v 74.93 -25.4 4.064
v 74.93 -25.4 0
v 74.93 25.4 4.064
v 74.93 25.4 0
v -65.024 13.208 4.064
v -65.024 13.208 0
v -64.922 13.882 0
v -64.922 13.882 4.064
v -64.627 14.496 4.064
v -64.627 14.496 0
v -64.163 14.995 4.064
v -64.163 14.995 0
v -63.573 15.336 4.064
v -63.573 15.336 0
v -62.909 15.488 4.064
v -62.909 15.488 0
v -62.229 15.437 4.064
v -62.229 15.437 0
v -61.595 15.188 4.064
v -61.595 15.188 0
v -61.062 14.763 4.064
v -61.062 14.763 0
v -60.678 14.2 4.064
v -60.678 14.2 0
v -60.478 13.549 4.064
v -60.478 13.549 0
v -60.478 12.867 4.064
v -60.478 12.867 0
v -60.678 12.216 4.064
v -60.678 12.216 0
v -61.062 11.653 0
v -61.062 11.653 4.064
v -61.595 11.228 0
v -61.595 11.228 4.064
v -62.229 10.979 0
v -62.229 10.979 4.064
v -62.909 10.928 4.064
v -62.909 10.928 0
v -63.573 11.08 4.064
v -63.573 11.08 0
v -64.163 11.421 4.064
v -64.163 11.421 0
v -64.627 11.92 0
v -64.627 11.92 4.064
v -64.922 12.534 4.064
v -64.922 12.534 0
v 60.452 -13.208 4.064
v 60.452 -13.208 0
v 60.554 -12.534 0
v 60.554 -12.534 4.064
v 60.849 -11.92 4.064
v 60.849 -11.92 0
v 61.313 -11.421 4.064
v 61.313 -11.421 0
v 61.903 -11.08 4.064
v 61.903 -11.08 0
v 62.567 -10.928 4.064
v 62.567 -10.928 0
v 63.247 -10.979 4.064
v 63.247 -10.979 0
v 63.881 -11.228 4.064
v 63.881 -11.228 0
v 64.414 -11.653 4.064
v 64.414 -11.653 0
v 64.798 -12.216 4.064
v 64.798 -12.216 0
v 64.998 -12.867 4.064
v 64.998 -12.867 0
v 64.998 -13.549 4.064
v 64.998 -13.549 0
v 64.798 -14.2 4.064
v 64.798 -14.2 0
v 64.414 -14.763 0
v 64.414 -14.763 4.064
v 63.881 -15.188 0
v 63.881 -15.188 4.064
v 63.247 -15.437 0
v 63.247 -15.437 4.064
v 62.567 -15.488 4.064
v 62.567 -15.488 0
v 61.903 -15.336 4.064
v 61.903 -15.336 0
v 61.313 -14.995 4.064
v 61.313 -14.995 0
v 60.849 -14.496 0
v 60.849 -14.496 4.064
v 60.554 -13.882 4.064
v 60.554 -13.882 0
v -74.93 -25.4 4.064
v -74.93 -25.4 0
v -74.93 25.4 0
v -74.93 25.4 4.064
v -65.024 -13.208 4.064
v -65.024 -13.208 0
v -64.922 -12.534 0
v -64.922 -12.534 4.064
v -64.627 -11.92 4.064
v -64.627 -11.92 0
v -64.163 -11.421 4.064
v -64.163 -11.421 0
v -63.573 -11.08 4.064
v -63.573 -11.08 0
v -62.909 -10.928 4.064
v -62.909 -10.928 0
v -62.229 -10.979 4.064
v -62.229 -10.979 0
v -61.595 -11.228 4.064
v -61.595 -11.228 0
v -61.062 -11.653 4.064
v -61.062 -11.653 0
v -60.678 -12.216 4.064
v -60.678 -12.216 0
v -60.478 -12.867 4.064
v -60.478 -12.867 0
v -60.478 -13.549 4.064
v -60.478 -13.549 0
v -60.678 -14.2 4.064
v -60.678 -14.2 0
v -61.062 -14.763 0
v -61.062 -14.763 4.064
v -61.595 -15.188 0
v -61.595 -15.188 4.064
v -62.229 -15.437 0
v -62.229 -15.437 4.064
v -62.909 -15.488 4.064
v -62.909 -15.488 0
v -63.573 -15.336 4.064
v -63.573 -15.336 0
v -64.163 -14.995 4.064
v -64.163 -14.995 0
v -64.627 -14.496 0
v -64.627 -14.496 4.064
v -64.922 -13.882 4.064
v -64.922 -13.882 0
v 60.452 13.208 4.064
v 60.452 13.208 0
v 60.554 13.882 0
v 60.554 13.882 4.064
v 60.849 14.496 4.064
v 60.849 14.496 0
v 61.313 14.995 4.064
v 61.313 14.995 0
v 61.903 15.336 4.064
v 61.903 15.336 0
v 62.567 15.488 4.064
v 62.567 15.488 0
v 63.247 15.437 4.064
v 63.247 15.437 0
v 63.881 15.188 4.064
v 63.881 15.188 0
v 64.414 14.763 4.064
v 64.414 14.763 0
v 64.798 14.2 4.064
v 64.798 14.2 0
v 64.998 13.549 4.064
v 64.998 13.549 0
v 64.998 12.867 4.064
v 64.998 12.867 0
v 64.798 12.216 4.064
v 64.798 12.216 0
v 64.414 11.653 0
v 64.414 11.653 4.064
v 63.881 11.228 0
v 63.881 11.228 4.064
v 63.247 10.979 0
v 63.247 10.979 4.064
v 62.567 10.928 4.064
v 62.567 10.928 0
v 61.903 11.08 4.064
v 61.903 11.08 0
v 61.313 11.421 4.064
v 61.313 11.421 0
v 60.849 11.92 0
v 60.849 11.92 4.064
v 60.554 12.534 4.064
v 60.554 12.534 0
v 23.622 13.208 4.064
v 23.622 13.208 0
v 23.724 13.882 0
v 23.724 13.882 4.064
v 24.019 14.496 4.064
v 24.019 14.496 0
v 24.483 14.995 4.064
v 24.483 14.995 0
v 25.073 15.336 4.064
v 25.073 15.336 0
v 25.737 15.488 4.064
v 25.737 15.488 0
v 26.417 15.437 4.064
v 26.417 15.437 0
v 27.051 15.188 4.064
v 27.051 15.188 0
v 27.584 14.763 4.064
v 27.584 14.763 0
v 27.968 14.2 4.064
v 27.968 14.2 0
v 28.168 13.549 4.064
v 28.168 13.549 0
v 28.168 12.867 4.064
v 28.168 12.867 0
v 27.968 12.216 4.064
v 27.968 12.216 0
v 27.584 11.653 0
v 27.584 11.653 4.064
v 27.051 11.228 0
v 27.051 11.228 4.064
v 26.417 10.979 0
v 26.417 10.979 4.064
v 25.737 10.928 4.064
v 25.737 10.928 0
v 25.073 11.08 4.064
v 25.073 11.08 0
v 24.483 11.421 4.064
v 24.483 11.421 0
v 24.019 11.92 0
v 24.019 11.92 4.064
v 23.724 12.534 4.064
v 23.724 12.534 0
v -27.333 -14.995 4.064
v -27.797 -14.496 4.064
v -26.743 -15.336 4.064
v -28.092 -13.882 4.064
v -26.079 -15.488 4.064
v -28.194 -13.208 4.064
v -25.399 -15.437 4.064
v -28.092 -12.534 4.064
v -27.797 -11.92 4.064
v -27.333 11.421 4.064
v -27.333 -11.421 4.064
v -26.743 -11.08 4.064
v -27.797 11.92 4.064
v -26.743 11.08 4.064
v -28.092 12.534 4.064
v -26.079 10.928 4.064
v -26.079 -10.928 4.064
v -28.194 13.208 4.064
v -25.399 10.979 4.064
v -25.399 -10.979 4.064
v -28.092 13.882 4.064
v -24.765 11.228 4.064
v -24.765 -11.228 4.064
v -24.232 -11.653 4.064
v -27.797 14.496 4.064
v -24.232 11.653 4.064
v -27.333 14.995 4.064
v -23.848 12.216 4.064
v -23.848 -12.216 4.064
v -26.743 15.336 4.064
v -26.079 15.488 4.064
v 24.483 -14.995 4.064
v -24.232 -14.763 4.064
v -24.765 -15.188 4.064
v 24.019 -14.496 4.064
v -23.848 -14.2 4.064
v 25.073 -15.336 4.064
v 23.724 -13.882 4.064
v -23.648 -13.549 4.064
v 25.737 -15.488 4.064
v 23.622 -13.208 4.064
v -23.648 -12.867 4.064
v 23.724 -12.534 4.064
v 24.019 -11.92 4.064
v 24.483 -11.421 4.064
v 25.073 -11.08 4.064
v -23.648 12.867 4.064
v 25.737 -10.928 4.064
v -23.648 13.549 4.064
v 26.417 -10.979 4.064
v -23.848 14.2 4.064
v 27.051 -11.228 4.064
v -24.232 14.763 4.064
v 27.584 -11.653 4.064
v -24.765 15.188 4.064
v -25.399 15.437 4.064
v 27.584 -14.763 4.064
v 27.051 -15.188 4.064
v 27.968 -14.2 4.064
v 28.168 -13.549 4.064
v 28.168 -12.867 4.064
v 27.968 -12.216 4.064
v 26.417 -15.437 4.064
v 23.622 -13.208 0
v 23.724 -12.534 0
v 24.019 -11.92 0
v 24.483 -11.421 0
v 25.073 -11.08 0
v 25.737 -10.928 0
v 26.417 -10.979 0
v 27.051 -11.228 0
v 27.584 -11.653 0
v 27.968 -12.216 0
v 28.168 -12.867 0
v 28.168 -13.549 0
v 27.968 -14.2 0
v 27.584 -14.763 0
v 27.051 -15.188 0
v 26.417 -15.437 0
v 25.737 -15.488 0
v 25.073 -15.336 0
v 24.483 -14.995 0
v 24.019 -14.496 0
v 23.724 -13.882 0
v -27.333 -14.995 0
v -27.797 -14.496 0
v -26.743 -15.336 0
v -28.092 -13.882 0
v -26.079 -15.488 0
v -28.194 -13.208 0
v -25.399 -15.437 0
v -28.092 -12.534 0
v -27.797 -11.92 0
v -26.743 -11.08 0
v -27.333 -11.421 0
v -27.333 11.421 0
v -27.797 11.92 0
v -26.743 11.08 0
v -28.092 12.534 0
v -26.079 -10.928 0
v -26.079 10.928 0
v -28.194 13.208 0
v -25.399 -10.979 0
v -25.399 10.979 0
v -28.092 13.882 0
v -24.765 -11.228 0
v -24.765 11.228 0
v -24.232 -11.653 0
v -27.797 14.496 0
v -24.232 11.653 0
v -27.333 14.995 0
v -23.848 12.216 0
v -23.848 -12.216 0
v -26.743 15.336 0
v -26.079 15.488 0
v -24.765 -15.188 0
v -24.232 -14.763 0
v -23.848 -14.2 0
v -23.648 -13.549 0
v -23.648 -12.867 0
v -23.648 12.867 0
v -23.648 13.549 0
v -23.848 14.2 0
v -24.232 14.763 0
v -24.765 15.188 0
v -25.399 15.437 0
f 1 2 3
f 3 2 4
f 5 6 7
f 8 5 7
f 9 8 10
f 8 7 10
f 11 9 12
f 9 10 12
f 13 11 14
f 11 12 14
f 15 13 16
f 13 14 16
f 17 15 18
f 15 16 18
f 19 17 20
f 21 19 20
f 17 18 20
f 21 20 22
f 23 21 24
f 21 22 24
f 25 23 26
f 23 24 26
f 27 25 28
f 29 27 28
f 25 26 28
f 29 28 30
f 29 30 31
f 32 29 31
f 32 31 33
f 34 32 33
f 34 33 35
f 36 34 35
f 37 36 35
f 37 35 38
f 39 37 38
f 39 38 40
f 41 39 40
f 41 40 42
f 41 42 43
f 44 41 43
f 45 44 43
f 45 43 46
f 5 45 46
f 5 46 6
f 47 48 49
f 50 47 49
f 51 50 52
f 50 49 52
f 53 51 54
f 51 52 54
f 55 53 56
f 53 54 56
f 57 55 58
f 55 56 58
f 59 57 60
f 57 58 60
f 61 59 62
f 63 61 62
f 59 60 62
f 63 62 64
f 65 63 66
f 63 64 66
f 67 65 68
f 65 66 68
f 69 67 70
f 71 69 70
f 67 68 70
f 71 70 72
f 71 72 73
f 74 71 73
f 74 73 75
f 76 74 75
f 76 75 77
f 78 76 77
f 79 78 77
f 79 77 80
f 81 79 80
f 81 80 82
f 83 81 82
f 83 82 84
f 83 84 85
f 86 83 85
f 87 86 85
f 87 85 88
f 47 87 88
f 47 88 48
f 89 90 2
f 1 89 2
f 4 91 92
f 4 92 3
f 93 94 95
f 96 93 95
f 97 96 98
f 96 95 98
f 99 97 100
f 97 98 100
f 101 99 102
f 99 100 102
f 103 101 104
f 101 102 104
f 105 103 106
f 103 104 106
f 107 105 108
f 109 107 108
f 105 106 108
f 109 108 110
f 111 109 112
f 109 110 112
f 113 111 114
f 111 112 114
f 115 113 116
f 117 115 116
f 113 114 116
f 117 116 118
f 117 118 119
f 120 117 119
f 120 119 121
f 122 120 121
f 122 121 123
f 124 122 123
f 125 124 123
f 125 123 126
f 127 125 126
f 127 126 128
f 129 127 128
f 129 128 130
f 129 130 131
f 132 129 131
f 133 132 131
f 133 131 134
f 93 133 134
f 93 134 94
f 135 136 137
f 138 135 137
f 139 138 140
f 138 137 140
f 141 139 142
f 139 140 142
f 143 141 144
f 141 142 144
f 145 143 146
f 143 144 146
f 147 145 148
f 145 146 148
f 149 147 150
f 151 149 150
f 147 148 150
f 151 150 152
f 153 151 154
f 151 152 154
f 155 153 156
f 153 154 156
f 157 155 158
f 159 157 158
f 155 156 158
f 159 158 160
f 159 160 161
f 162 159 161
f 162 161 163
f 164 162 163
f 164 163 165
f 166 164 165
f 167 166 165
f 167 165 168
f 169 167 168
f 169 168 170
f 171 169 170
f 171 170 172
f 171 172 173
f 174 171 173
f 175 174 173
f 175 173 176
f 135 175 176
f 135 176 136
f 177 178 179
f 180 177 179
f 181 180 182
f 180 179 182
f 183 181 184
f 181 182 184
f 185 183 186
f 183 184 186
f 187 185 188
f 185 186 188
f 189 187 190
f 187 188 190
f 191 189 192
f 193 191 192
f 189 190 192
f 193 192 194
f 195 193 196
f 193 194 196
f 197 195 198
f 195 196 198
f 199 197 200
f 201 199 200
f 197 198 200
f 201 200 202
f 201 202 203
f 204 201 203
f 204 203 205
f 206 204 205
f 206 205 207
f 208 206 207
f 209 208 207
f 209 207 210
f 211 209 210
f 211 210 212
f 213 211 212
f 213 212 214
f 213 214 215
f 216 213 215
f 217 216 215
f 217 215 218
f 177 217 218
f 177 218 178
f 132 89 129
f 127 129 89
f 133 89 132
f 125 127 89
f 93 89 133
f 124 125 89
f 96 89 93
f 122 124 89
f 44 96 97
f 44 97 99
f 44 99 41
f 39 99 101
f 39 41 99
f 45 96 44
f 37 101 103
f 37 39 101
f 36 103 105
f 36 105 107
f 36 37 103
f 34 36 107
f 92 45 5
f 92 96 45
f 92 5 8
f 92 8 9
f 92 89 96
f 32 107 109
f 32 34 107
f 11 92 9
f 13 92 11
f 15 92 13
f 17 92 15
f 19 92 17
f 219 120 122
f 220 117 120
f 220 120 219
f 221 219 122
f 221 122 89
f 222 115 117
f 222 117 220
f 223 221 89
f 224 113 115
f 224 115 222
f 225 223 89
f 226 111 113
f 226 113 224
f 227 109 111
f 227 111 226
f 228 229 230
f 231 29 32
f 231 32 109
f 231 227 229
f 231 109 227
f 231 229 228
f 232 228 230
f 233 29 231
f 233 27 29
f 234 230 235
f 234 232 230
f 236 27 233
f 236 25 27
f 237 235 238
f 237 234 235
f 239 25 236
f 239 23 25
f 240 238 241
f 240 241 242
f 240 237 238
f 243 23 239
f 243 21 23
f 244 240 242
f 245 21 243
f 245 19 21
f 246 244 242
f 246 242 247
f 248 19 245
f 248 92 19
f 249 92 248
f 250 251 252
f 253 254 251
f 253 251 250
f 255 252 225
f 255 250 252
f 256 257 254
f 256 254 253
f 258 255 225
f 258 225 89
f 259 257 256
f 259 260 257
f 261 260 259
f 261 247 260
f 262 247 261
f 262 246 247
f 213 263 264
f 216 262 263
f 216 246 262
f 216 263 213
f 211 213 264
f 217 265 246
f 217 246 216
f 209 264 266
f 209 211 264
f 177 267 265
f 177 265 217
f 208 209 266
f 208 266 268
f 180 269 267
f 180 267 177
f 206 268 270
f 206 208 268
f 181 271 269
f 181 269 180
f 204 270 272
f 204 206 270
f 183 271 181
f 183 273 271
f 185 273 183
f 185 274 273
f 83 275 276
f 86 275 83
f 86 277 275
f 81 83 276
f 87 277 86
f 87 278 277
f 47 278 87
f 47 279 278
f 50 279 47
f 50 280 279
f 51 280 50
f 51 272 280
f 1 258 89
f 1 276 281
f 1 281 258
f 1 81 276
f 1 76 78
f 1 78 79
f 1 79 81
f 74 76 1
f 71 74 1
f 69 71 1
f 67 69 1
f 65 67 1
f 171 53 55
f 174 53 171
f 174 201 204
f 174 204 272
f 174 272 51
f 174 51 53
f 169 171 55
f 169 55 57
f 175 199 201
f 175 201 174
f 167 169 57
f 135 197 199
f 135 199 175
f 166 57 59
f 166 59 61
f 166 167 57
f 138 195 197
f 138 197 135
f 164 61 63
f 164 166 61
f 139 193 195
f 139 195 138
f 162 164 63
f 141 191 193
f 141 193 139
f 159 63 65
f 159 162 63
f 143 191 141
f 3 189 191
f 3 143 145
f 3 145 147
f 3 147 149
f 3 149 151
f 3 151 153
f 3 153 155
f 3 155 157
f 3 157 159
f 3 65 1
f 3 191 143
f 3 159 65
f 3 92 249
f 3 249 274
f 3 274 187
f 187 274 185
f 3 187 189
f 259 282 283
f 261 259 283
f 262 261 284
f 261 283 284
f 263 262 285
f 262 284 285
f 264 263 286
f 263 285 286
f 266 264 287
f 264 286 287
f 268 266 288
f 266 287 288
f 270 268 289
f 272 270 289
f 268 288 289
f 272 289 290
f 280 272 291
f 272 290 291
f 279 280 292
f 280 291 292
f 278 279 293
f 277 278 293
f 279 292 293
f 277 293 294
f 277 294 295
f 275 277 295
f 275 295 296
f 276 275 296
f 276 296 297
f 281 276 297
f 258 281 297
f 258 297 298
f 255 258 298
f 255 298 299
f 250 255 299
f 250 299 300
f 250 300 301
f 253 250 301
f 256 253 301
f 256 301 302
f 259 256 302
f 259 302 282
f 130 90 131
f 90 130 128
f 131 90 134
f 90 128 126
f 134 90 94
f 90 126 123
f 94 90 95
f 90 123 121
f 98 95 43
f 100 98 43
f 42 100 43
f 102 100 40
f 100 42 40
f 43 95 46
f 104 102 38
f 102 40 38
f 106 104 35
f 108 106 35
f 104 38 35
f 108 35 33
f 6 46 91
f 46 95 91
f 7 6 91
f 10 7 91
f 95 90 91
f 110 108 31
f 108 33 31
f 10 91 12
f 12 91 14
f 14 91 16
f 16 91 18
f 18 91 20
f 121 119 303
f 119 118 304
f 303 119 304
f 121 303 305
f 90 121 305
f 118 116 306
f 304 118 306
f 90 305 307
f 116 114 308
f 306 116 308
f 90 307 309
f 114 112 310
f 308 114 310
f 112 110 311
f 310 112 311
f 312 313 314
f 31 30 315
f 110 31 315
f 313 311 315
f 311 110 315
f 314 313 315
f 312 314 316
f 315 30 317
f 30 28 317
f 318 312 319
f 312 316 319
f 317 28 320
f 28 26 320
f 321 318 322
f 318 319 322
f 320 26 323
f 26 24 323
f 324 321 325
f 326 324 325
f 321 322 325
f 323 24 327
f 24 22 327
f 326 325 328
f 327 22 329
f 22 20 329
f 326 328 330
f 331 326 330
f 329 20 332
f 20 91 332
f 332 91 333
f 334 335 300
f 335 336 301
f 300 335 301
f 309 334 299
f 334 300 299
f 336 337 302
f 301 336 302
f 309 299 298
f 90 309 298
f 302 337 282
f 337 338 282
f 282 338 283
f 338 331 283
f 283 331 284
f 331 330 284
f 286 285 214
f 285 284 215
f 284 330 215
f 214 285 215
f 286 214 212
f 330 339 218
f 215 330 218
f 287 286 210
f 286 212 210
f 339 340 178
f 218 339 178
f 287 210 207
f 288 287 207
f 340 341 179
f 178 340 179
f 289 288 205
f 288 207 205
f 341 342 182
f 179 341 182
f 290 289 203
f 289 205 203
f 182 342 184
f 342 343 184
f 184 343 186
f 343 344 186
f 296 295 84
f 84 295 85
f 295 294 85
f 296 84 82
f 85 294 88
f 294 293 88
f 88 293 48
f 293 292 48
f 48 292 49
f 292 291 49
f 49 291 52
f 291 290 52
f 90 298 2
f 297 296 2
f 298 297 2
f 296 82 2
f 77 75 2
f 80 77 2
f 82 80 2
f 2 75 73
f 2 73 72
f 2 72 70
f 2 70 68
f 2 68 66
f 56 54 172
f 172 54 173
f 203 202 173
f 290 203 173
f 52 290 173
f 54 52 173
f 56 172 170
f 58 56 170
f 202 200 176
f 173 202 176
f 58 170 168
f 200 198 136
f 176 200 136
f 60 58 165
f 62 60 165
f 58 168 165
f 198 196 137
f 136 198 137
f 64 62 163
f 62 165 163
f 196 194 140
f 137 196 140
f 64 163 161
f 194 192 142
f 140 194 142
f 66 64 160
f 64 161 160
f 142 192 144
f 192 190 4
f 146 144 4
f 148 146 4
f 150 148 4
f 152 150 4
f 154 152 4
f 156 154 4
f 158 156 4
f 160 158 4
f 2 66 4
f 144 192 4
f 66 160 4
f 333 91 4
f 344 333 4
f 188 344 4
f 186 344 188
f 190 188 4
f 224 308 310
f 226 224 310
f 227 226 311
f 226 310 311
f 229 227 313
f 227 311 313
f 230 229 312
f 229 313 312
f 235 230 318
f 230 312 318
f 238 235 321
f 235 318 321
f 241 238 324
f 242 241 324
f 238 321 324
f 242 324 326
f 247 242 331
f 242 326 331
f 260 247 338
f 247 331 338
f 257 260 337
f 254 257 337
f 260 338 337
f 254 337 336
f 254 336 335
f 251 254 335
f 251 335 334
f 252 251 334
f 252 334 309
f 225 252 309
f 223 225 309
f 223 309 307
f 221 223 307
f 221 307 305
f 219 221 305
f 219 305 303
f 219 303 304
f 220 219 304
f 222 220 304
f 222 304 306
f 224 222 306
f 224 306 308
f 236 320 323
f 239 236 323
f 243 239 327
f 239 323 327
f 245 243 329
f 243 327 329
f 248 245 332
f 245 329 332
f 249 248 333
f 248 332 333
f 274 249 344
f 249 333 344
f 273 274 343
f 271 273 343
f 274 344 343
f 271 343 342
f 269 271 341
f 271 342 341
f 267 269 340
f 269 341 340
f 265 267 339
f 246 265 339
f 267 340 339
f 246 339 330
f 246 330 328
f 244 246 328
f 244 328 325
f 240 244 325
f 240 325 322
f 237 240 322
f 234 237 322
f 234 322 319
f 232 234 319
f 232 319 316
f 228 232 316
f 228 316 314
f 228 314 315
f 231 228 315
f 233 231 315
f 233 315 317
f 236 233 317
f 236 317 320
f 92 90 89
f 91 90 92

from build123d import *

# Parameters (mm, degrees)
F0_W     = 149.86
F0_H     = 50.8
F1_DEPTH = 4.064
F3_D     = 4.572


with BuildPart() as f1:
    # F0 (on Top) → F1 (new body)
    with BuildSketch(Plane.XY):
        Rectangle(F0_W, F0_H)
    extrude(amount=F1_DEPTH)

    # F3 (through all)
    with Locations(Plane.XY.offset(4.064)):
        with Locations((-62.738, 13.208), (-25.908, 13.208), (-25.908, -13.208), (-62.738, -13.208), (25.908, 13.208), (62.738, 13.208), (62.738, -13.208), (25.908, -13.208)):
            Hole(F3_D / 2)


solid = f1.part
